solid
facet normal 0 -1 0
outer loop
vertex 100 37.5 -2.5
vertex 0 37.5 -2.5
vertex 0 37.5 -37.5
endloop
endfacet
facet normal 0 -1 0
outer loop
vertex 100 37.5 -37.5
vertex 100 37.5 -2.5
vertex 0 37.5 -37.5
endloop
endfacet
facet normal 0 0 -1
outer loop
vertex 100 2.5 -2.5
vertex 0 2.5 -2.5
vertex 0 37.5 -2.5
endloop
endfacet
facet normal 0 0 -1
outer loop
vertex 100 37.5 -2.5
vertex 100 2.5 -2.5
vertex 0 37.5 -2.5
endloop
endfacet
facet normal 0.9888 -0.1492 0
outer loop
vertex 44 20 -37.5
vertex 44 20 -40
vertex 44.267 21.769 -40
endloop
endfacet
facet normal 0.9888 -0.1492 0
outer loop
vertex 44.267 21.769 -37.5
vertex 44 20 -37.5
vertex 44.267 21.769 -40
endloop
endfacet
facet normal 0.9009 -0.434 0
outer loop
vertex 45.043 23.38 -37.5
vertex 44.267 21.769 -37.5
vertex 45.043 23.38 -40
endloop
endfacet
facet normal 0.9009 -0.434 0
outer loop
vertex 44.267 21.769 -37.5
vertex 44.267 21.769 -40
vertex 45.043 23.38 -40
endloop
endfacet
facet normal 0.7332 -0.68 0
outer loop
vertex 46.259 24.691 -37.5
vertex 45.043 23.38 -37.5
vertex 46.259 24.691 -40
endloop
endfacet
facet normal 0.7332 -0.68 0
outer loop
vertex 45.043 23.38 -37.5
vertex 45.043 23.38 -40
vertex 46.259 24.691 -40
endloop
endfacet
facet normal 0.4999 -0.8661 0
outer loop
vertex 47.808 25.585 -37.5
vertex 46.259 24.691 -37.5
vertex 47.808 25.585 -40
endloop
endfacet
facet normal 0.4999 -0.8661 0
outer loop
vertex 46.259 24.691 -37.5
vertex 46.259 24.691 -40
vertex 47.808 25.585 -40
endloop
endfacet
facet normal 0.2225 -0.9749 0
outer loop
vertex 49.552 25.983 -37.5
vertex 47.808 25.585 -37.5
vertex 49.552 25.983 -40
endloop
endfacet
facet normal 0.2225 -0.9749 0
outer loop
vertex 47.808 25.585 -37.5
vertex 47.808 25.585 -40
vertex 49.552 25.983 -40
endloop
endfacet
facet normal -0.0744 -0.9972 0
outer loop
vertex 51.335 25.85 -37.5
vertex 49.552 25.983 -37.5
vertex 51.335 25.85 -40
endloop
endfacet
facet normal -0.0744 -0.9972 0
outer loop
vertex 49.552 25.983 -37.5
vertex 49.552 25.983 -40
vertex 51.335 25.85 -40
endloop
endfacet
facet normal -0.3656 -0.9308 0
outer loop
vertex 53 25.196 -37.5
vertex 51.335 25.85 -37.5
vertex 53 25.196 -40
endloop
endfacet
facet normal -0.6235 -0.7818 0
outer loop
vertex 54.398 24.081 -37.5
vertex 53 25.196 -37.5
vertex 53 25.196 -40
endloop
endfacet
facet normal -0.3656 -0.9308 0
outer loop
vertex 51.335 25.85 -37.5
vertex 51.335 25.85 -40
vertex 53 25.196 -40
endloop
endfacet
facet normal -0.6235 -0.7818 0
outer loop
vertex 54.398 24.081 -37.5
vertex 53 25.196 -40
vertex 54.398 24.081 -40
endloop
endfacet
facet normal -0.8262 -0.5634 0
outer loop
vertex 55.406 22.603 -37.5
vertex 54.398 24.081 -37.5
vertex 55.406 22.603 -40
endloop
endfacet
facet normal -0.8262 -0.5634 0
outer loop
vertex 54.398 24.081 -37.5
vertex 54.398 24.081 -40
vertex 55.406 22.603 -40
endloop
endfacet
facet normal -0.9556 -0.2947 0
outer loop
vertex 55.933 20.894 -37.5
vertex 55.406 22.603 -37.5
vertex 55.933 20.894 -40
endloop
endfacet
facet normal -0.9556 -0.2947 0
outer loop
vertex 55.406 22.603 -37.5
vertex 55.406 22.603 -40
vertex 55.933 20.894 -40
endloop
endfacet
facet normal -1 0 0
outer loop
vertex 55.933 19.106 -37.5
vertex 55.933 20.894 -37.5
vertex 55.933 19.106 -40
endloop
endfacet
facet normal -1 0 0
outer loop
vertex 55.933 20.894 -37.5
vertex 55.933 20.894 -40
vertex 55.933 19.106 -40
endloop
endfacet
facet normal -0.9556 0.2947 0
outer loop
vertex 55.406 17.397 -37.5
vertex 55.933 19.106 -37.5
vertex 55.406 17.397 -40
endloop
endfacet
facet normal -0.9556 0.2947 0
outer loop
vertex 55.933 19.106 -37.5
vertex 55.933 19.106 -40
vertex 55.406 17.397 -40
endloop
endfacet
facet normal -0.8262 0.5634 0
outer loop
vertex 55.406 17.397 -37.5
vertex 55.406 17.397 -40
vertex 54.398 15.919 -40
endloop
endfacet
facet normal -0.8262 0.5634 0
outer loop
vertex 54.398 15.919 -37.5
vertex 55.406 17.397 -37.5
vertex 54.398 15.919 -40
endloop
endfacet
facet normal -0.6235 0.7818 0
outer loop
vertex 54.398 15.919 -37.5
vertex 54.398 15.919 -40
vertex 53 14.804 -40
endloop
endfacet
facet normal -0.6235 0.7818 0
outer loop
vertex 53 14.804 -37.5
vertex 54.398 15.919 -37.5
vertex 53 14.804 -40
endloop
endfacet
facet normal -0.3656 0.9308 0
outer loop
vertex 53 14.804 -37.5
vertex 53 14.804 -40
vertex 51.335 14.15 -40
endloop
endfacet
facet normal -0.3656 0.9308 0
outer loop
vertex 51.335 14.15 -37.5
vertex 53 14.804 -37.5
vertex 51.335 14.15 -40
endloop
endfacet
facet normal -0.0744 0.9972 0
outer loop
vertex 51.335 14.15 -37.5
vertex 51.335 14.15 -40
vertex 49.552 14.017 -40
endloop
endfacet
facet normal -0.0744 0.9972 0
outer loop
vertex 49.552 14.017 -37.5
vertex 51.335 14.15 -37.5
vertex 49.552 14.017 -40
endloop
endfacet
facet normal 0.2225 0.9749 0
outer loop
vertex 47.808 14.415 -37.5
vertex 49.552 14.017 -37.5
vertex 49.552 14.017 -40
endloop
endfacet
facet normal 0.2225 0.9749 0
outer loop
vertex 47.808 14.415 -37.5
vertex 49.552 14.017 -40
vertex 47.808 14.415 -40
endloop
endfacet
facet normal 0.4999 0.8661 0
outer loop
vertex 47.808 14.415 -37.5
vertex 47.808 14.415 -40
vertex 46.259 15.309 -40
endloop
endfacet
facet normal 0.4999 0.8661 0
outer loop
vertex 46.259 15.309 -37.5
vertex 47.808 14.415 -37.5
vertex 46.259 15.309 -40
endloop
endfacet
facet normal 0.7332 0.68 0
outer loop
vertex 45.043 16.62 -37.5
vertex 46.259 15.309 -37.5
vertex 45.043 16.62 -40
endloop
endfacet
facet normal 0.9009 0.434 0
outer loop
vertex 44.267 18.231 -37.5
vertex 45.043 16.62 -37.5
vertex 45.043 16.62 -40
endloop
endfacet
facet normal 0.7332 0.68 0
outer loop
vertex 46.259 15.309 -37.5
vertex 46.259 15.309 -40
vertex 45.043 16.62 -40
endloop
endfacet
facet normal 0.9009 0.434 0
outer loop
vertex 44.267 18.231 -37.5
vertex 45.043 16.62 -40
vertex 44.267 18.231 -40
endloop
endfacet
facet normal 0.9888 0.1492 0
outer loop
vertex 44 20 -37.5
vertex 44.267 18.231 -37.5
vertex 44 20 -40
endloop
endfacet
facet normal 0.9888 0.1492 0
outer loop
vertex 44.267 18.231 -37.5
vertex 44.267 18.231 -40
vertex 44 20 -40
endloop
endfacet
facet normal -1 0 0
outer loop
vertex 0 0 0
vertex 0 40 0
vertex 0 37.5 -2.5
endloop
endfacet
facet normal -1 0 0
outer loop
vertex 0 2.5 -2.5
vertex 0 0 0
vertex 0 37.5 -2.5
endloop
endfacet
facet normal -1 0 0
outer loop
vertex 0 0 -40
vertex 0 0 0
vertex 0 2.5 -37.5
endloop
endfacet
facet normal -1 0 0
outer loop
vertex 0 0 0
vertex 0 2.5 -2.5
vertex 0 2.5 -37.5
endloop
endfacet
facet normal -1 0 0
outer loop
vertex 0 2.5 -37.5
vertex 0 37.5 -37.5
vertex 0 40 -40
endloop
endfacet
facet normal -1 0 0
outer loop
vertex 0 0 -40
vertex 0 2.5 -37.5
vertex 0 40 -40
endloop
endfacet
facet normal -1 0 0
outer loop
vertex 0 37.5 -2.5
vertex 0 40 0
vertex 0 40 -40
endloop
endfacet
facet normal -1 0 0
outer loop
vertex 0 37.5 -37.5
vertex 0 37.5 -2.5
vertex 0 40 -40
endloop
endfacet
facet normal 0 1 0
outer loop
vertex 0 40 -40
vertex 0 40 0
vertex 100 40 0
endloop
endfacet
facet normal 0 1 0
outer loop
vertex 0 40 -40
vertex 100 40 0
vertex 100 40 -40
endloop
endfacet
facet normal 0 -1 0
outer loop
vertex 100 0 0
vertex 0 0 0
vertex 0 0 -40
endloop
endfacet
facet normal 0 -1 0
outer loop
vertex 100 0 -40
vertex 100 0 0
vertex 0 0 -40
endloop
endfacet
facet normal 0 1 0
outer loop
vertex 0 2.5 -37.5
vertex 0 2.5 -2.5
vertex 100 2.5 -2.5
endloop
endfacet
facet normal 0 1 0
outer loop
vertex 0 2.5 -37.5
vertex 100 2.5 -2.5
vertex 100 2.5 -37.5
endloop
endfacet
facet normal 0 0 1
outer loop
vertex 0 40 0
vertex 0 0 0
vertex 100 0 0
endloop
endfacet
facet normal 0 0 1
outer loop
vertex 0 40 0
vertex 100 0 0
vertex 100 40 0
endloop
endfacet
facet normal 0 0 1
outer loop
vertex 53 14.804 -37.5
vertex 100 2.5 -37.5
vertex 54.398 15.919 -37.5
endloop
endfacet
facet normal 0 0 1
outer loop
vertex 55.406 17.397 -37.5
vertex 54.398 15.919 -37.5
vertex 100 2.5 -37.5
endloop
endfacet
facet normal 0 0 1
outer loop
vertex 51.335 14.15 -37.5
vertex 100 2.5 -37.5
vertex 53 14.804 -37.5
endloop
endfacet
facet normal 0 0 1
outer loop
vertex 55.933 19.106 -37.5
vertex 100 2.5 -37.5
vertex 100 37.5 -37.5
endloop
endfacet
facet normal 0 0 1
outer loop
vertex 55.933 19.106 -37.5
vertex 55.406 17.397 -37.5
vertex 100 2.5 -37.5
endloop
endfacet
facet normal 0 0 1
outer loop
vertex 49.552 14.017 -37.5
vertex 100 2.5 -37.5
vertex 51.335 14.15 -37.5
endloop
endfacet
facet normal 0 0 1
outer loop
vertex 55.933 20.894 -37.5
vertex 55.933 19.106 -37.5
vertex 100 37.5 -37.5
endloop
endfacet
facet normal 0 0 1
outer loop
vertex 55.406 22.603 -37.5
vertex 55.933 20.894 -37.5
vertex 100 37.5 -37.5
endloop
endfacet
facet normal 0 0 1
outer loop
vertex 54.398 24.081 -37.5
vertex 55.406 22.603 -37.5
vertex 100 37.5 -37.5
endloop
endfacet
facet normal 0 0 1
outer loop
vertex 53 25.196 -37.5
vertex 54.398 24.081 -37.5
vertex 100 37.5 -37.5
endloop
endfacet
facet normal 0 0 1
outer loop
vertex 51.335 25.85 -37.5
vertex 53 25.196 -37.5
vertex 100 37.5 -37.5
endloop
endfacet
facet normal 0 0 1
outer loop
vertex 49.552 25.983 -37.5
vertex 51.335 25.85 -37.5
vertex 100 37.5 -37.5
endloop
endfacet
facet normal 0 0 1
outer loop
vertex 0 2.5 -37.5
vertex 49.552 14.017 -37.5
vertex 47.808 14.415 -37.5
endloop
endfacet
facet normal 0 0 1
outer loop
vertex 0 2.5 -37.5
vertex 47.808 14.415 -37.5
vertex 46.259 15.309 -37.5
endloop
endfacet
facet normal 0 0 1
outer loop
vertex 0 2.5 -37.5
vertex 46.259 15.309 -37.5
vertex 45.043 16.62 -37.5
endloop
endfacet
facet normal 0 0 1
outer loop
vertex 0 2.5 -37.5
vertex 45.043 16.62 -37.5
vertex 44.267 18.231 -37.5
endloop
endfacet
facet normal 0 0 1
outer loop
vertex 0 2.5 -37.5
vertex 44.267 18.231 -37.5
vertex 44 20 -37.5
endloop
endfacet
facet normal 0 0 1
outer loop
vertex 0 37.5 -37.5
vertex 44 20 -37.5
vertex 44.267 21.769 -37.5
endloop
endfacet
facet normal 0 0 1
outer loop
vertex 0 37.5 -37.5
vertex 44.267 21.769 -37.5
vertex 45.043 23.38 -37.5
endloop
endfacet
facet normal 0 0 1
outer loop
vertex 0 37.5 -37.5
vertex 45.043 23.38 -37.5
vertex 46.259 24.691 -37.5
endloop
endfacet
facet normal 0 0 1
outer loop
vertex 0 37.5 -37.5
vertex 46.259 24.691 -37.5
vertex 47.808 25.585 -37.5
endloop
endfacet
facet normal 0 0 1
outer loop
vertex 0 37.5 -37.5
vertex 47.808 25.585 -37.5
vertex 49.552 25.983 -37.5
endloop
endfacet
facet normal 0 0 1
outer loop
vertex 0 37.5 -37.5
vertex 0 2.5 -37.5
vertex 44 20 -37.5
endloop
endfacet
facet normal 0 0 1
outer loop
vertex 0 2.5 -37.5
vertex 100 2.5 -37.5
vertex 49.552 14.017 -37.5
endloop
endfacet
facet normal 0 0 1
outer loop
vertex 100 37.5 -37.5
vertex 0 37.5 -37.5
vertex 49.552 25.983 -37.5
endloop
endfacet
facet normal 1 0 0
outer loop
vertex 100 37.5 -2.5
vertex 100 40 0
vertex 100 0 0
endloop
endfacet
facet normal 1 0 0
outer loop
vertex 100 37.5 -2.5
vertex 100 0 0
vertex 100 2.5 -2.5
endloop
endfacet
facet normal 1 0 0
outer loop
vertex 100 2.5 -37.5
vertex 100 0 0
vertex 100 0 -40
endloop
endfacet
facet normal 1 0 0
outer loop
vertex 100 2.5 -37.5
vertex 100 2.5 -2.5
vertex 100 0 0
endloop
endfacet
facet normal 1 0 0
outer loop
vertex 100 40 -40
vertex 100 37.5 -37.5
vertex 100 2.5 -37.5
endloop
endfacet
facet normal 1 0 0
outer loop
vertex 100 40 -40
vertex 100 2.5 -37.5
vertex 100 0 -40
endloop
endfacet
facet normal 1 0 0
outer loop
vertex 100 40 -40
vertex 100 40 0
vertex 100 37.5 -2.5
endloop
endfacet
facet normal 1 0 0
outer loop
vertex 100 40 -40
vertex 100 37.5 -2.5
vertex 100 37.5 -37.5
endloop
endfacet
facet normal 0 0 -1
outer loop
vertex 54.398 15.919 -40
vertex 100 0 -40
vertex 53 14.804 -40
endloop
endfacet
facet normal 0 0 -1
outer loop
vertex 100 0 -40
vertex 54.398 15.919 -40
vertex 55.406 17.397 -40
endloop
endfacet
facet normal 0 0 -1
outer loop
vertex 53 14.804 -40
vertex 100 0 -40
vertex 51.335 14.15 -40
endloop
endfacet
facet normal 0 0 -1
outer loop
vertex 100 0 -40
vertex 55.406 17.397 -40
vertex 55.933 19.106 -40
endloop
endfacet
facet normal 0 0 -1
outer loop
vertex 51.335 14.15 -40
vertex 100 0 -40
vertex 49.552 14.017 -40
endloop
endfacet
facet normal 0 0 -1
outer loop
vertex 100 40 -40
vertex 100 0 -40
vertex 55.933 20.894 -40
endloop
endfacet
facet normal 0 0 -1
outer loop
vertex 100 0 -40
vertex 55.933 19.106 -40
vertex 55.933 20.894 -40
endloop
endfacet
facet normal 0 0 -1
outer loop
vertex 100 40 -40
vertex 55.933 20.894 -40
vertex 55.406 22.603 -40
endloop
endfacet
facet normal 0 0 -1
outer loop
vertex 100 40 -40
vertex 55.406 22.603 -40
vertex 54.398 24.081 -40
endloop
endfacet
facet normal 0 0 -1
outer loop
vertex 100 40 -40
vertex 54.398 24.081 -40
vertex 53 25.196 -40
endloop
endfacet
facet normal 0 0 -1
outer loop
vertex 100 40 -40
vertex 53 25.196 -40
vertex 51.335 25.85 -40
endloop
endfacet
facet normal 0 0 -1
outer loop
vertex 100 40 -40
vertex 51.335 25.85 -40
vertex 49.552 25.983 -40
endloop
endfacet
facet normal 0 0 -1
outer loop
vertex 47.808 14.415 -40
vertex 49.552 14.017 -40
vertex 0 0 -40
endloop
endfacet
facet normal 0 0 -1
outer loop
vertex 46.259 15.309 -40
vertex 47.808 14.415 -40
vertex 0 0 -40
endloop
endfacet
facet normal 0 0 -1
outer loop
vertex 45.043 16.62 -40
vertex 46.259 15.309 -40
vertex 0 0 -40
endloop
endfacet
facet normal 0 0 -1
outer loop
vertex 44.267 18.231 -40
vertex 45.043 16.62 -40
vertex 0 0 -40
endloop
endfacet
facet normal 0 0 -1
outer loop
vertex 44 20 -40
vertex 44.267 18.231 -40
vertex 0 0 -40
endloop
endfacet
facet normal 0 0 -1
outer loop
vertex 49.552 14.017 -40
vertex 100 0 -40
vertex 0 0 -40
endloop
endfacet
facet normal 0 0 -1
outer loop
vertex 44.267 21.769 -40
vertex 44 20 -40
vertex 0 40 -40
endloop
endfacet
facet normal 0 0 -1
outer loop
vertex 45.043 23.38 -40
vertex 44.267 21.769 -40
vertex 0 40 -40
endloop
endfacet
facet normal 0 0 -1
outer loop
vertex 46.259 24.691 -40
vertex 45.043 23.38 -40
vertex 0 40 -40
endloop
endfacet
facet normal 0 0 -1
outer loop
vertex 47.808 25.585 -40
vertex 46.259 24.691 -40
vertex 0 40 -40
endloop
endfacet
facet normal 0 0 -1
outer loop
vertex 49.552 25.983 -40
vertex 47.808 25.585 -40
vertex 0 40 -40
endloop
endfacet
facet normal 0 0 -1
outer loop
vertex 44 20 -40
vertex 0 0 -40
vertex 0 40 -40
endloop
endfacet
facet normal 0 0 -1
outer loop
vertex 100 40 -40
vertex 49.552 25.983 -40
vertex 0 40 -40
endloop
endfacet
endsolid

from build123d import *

# Parameters (mm, degrees)
SKETCH2_W           = 40
SKETCH2_H           = 40
BOSS_EXTRUDE1_DEPTH = 100
SHELL1_T            = -2.5
SKETCH3_R           = 6
CUT_EXTRUDE1_DEPTH  = 2.5


with BuildPart() as part:
    # Sketch2 → Boss-Extrude1 (new body)
    with BuildSketch(Plane(origin=(0, 0, 0), x_dir=(0, 0, -1), z_dir=(1, 0, 0))):
        with Locations((20, 20)):
            Rectangle(SKETCH2_W, SKETCH2_H)
    extrude(amount=BOSS_EXTRUDE1_DEPTH)

    # Shell1
    shell1_openings = [part.faces().sort_by_distance(p)[0] for p in [
        (100, 20, -20),
        (0, 20, -20),
    ]]
    offset(amount=SHELL1_T, openings=shell1_openings, kind=Kind.INTERSECTION)

    # Sketch3 → Cut-Extrude1 (cut)
    with BuildSketch(Plane(origin=(0, 0, -40), x_dir=(-1, 0, 0), z_dir=(0, 0, -1))):
        with Locations((-50, 20)):
            Circle(SKETCH3_R)
    extrude(amount=-CUT_EXTRUDE1_DEPTH, mode=Mode.SUBTRACT)


solid = part.part
